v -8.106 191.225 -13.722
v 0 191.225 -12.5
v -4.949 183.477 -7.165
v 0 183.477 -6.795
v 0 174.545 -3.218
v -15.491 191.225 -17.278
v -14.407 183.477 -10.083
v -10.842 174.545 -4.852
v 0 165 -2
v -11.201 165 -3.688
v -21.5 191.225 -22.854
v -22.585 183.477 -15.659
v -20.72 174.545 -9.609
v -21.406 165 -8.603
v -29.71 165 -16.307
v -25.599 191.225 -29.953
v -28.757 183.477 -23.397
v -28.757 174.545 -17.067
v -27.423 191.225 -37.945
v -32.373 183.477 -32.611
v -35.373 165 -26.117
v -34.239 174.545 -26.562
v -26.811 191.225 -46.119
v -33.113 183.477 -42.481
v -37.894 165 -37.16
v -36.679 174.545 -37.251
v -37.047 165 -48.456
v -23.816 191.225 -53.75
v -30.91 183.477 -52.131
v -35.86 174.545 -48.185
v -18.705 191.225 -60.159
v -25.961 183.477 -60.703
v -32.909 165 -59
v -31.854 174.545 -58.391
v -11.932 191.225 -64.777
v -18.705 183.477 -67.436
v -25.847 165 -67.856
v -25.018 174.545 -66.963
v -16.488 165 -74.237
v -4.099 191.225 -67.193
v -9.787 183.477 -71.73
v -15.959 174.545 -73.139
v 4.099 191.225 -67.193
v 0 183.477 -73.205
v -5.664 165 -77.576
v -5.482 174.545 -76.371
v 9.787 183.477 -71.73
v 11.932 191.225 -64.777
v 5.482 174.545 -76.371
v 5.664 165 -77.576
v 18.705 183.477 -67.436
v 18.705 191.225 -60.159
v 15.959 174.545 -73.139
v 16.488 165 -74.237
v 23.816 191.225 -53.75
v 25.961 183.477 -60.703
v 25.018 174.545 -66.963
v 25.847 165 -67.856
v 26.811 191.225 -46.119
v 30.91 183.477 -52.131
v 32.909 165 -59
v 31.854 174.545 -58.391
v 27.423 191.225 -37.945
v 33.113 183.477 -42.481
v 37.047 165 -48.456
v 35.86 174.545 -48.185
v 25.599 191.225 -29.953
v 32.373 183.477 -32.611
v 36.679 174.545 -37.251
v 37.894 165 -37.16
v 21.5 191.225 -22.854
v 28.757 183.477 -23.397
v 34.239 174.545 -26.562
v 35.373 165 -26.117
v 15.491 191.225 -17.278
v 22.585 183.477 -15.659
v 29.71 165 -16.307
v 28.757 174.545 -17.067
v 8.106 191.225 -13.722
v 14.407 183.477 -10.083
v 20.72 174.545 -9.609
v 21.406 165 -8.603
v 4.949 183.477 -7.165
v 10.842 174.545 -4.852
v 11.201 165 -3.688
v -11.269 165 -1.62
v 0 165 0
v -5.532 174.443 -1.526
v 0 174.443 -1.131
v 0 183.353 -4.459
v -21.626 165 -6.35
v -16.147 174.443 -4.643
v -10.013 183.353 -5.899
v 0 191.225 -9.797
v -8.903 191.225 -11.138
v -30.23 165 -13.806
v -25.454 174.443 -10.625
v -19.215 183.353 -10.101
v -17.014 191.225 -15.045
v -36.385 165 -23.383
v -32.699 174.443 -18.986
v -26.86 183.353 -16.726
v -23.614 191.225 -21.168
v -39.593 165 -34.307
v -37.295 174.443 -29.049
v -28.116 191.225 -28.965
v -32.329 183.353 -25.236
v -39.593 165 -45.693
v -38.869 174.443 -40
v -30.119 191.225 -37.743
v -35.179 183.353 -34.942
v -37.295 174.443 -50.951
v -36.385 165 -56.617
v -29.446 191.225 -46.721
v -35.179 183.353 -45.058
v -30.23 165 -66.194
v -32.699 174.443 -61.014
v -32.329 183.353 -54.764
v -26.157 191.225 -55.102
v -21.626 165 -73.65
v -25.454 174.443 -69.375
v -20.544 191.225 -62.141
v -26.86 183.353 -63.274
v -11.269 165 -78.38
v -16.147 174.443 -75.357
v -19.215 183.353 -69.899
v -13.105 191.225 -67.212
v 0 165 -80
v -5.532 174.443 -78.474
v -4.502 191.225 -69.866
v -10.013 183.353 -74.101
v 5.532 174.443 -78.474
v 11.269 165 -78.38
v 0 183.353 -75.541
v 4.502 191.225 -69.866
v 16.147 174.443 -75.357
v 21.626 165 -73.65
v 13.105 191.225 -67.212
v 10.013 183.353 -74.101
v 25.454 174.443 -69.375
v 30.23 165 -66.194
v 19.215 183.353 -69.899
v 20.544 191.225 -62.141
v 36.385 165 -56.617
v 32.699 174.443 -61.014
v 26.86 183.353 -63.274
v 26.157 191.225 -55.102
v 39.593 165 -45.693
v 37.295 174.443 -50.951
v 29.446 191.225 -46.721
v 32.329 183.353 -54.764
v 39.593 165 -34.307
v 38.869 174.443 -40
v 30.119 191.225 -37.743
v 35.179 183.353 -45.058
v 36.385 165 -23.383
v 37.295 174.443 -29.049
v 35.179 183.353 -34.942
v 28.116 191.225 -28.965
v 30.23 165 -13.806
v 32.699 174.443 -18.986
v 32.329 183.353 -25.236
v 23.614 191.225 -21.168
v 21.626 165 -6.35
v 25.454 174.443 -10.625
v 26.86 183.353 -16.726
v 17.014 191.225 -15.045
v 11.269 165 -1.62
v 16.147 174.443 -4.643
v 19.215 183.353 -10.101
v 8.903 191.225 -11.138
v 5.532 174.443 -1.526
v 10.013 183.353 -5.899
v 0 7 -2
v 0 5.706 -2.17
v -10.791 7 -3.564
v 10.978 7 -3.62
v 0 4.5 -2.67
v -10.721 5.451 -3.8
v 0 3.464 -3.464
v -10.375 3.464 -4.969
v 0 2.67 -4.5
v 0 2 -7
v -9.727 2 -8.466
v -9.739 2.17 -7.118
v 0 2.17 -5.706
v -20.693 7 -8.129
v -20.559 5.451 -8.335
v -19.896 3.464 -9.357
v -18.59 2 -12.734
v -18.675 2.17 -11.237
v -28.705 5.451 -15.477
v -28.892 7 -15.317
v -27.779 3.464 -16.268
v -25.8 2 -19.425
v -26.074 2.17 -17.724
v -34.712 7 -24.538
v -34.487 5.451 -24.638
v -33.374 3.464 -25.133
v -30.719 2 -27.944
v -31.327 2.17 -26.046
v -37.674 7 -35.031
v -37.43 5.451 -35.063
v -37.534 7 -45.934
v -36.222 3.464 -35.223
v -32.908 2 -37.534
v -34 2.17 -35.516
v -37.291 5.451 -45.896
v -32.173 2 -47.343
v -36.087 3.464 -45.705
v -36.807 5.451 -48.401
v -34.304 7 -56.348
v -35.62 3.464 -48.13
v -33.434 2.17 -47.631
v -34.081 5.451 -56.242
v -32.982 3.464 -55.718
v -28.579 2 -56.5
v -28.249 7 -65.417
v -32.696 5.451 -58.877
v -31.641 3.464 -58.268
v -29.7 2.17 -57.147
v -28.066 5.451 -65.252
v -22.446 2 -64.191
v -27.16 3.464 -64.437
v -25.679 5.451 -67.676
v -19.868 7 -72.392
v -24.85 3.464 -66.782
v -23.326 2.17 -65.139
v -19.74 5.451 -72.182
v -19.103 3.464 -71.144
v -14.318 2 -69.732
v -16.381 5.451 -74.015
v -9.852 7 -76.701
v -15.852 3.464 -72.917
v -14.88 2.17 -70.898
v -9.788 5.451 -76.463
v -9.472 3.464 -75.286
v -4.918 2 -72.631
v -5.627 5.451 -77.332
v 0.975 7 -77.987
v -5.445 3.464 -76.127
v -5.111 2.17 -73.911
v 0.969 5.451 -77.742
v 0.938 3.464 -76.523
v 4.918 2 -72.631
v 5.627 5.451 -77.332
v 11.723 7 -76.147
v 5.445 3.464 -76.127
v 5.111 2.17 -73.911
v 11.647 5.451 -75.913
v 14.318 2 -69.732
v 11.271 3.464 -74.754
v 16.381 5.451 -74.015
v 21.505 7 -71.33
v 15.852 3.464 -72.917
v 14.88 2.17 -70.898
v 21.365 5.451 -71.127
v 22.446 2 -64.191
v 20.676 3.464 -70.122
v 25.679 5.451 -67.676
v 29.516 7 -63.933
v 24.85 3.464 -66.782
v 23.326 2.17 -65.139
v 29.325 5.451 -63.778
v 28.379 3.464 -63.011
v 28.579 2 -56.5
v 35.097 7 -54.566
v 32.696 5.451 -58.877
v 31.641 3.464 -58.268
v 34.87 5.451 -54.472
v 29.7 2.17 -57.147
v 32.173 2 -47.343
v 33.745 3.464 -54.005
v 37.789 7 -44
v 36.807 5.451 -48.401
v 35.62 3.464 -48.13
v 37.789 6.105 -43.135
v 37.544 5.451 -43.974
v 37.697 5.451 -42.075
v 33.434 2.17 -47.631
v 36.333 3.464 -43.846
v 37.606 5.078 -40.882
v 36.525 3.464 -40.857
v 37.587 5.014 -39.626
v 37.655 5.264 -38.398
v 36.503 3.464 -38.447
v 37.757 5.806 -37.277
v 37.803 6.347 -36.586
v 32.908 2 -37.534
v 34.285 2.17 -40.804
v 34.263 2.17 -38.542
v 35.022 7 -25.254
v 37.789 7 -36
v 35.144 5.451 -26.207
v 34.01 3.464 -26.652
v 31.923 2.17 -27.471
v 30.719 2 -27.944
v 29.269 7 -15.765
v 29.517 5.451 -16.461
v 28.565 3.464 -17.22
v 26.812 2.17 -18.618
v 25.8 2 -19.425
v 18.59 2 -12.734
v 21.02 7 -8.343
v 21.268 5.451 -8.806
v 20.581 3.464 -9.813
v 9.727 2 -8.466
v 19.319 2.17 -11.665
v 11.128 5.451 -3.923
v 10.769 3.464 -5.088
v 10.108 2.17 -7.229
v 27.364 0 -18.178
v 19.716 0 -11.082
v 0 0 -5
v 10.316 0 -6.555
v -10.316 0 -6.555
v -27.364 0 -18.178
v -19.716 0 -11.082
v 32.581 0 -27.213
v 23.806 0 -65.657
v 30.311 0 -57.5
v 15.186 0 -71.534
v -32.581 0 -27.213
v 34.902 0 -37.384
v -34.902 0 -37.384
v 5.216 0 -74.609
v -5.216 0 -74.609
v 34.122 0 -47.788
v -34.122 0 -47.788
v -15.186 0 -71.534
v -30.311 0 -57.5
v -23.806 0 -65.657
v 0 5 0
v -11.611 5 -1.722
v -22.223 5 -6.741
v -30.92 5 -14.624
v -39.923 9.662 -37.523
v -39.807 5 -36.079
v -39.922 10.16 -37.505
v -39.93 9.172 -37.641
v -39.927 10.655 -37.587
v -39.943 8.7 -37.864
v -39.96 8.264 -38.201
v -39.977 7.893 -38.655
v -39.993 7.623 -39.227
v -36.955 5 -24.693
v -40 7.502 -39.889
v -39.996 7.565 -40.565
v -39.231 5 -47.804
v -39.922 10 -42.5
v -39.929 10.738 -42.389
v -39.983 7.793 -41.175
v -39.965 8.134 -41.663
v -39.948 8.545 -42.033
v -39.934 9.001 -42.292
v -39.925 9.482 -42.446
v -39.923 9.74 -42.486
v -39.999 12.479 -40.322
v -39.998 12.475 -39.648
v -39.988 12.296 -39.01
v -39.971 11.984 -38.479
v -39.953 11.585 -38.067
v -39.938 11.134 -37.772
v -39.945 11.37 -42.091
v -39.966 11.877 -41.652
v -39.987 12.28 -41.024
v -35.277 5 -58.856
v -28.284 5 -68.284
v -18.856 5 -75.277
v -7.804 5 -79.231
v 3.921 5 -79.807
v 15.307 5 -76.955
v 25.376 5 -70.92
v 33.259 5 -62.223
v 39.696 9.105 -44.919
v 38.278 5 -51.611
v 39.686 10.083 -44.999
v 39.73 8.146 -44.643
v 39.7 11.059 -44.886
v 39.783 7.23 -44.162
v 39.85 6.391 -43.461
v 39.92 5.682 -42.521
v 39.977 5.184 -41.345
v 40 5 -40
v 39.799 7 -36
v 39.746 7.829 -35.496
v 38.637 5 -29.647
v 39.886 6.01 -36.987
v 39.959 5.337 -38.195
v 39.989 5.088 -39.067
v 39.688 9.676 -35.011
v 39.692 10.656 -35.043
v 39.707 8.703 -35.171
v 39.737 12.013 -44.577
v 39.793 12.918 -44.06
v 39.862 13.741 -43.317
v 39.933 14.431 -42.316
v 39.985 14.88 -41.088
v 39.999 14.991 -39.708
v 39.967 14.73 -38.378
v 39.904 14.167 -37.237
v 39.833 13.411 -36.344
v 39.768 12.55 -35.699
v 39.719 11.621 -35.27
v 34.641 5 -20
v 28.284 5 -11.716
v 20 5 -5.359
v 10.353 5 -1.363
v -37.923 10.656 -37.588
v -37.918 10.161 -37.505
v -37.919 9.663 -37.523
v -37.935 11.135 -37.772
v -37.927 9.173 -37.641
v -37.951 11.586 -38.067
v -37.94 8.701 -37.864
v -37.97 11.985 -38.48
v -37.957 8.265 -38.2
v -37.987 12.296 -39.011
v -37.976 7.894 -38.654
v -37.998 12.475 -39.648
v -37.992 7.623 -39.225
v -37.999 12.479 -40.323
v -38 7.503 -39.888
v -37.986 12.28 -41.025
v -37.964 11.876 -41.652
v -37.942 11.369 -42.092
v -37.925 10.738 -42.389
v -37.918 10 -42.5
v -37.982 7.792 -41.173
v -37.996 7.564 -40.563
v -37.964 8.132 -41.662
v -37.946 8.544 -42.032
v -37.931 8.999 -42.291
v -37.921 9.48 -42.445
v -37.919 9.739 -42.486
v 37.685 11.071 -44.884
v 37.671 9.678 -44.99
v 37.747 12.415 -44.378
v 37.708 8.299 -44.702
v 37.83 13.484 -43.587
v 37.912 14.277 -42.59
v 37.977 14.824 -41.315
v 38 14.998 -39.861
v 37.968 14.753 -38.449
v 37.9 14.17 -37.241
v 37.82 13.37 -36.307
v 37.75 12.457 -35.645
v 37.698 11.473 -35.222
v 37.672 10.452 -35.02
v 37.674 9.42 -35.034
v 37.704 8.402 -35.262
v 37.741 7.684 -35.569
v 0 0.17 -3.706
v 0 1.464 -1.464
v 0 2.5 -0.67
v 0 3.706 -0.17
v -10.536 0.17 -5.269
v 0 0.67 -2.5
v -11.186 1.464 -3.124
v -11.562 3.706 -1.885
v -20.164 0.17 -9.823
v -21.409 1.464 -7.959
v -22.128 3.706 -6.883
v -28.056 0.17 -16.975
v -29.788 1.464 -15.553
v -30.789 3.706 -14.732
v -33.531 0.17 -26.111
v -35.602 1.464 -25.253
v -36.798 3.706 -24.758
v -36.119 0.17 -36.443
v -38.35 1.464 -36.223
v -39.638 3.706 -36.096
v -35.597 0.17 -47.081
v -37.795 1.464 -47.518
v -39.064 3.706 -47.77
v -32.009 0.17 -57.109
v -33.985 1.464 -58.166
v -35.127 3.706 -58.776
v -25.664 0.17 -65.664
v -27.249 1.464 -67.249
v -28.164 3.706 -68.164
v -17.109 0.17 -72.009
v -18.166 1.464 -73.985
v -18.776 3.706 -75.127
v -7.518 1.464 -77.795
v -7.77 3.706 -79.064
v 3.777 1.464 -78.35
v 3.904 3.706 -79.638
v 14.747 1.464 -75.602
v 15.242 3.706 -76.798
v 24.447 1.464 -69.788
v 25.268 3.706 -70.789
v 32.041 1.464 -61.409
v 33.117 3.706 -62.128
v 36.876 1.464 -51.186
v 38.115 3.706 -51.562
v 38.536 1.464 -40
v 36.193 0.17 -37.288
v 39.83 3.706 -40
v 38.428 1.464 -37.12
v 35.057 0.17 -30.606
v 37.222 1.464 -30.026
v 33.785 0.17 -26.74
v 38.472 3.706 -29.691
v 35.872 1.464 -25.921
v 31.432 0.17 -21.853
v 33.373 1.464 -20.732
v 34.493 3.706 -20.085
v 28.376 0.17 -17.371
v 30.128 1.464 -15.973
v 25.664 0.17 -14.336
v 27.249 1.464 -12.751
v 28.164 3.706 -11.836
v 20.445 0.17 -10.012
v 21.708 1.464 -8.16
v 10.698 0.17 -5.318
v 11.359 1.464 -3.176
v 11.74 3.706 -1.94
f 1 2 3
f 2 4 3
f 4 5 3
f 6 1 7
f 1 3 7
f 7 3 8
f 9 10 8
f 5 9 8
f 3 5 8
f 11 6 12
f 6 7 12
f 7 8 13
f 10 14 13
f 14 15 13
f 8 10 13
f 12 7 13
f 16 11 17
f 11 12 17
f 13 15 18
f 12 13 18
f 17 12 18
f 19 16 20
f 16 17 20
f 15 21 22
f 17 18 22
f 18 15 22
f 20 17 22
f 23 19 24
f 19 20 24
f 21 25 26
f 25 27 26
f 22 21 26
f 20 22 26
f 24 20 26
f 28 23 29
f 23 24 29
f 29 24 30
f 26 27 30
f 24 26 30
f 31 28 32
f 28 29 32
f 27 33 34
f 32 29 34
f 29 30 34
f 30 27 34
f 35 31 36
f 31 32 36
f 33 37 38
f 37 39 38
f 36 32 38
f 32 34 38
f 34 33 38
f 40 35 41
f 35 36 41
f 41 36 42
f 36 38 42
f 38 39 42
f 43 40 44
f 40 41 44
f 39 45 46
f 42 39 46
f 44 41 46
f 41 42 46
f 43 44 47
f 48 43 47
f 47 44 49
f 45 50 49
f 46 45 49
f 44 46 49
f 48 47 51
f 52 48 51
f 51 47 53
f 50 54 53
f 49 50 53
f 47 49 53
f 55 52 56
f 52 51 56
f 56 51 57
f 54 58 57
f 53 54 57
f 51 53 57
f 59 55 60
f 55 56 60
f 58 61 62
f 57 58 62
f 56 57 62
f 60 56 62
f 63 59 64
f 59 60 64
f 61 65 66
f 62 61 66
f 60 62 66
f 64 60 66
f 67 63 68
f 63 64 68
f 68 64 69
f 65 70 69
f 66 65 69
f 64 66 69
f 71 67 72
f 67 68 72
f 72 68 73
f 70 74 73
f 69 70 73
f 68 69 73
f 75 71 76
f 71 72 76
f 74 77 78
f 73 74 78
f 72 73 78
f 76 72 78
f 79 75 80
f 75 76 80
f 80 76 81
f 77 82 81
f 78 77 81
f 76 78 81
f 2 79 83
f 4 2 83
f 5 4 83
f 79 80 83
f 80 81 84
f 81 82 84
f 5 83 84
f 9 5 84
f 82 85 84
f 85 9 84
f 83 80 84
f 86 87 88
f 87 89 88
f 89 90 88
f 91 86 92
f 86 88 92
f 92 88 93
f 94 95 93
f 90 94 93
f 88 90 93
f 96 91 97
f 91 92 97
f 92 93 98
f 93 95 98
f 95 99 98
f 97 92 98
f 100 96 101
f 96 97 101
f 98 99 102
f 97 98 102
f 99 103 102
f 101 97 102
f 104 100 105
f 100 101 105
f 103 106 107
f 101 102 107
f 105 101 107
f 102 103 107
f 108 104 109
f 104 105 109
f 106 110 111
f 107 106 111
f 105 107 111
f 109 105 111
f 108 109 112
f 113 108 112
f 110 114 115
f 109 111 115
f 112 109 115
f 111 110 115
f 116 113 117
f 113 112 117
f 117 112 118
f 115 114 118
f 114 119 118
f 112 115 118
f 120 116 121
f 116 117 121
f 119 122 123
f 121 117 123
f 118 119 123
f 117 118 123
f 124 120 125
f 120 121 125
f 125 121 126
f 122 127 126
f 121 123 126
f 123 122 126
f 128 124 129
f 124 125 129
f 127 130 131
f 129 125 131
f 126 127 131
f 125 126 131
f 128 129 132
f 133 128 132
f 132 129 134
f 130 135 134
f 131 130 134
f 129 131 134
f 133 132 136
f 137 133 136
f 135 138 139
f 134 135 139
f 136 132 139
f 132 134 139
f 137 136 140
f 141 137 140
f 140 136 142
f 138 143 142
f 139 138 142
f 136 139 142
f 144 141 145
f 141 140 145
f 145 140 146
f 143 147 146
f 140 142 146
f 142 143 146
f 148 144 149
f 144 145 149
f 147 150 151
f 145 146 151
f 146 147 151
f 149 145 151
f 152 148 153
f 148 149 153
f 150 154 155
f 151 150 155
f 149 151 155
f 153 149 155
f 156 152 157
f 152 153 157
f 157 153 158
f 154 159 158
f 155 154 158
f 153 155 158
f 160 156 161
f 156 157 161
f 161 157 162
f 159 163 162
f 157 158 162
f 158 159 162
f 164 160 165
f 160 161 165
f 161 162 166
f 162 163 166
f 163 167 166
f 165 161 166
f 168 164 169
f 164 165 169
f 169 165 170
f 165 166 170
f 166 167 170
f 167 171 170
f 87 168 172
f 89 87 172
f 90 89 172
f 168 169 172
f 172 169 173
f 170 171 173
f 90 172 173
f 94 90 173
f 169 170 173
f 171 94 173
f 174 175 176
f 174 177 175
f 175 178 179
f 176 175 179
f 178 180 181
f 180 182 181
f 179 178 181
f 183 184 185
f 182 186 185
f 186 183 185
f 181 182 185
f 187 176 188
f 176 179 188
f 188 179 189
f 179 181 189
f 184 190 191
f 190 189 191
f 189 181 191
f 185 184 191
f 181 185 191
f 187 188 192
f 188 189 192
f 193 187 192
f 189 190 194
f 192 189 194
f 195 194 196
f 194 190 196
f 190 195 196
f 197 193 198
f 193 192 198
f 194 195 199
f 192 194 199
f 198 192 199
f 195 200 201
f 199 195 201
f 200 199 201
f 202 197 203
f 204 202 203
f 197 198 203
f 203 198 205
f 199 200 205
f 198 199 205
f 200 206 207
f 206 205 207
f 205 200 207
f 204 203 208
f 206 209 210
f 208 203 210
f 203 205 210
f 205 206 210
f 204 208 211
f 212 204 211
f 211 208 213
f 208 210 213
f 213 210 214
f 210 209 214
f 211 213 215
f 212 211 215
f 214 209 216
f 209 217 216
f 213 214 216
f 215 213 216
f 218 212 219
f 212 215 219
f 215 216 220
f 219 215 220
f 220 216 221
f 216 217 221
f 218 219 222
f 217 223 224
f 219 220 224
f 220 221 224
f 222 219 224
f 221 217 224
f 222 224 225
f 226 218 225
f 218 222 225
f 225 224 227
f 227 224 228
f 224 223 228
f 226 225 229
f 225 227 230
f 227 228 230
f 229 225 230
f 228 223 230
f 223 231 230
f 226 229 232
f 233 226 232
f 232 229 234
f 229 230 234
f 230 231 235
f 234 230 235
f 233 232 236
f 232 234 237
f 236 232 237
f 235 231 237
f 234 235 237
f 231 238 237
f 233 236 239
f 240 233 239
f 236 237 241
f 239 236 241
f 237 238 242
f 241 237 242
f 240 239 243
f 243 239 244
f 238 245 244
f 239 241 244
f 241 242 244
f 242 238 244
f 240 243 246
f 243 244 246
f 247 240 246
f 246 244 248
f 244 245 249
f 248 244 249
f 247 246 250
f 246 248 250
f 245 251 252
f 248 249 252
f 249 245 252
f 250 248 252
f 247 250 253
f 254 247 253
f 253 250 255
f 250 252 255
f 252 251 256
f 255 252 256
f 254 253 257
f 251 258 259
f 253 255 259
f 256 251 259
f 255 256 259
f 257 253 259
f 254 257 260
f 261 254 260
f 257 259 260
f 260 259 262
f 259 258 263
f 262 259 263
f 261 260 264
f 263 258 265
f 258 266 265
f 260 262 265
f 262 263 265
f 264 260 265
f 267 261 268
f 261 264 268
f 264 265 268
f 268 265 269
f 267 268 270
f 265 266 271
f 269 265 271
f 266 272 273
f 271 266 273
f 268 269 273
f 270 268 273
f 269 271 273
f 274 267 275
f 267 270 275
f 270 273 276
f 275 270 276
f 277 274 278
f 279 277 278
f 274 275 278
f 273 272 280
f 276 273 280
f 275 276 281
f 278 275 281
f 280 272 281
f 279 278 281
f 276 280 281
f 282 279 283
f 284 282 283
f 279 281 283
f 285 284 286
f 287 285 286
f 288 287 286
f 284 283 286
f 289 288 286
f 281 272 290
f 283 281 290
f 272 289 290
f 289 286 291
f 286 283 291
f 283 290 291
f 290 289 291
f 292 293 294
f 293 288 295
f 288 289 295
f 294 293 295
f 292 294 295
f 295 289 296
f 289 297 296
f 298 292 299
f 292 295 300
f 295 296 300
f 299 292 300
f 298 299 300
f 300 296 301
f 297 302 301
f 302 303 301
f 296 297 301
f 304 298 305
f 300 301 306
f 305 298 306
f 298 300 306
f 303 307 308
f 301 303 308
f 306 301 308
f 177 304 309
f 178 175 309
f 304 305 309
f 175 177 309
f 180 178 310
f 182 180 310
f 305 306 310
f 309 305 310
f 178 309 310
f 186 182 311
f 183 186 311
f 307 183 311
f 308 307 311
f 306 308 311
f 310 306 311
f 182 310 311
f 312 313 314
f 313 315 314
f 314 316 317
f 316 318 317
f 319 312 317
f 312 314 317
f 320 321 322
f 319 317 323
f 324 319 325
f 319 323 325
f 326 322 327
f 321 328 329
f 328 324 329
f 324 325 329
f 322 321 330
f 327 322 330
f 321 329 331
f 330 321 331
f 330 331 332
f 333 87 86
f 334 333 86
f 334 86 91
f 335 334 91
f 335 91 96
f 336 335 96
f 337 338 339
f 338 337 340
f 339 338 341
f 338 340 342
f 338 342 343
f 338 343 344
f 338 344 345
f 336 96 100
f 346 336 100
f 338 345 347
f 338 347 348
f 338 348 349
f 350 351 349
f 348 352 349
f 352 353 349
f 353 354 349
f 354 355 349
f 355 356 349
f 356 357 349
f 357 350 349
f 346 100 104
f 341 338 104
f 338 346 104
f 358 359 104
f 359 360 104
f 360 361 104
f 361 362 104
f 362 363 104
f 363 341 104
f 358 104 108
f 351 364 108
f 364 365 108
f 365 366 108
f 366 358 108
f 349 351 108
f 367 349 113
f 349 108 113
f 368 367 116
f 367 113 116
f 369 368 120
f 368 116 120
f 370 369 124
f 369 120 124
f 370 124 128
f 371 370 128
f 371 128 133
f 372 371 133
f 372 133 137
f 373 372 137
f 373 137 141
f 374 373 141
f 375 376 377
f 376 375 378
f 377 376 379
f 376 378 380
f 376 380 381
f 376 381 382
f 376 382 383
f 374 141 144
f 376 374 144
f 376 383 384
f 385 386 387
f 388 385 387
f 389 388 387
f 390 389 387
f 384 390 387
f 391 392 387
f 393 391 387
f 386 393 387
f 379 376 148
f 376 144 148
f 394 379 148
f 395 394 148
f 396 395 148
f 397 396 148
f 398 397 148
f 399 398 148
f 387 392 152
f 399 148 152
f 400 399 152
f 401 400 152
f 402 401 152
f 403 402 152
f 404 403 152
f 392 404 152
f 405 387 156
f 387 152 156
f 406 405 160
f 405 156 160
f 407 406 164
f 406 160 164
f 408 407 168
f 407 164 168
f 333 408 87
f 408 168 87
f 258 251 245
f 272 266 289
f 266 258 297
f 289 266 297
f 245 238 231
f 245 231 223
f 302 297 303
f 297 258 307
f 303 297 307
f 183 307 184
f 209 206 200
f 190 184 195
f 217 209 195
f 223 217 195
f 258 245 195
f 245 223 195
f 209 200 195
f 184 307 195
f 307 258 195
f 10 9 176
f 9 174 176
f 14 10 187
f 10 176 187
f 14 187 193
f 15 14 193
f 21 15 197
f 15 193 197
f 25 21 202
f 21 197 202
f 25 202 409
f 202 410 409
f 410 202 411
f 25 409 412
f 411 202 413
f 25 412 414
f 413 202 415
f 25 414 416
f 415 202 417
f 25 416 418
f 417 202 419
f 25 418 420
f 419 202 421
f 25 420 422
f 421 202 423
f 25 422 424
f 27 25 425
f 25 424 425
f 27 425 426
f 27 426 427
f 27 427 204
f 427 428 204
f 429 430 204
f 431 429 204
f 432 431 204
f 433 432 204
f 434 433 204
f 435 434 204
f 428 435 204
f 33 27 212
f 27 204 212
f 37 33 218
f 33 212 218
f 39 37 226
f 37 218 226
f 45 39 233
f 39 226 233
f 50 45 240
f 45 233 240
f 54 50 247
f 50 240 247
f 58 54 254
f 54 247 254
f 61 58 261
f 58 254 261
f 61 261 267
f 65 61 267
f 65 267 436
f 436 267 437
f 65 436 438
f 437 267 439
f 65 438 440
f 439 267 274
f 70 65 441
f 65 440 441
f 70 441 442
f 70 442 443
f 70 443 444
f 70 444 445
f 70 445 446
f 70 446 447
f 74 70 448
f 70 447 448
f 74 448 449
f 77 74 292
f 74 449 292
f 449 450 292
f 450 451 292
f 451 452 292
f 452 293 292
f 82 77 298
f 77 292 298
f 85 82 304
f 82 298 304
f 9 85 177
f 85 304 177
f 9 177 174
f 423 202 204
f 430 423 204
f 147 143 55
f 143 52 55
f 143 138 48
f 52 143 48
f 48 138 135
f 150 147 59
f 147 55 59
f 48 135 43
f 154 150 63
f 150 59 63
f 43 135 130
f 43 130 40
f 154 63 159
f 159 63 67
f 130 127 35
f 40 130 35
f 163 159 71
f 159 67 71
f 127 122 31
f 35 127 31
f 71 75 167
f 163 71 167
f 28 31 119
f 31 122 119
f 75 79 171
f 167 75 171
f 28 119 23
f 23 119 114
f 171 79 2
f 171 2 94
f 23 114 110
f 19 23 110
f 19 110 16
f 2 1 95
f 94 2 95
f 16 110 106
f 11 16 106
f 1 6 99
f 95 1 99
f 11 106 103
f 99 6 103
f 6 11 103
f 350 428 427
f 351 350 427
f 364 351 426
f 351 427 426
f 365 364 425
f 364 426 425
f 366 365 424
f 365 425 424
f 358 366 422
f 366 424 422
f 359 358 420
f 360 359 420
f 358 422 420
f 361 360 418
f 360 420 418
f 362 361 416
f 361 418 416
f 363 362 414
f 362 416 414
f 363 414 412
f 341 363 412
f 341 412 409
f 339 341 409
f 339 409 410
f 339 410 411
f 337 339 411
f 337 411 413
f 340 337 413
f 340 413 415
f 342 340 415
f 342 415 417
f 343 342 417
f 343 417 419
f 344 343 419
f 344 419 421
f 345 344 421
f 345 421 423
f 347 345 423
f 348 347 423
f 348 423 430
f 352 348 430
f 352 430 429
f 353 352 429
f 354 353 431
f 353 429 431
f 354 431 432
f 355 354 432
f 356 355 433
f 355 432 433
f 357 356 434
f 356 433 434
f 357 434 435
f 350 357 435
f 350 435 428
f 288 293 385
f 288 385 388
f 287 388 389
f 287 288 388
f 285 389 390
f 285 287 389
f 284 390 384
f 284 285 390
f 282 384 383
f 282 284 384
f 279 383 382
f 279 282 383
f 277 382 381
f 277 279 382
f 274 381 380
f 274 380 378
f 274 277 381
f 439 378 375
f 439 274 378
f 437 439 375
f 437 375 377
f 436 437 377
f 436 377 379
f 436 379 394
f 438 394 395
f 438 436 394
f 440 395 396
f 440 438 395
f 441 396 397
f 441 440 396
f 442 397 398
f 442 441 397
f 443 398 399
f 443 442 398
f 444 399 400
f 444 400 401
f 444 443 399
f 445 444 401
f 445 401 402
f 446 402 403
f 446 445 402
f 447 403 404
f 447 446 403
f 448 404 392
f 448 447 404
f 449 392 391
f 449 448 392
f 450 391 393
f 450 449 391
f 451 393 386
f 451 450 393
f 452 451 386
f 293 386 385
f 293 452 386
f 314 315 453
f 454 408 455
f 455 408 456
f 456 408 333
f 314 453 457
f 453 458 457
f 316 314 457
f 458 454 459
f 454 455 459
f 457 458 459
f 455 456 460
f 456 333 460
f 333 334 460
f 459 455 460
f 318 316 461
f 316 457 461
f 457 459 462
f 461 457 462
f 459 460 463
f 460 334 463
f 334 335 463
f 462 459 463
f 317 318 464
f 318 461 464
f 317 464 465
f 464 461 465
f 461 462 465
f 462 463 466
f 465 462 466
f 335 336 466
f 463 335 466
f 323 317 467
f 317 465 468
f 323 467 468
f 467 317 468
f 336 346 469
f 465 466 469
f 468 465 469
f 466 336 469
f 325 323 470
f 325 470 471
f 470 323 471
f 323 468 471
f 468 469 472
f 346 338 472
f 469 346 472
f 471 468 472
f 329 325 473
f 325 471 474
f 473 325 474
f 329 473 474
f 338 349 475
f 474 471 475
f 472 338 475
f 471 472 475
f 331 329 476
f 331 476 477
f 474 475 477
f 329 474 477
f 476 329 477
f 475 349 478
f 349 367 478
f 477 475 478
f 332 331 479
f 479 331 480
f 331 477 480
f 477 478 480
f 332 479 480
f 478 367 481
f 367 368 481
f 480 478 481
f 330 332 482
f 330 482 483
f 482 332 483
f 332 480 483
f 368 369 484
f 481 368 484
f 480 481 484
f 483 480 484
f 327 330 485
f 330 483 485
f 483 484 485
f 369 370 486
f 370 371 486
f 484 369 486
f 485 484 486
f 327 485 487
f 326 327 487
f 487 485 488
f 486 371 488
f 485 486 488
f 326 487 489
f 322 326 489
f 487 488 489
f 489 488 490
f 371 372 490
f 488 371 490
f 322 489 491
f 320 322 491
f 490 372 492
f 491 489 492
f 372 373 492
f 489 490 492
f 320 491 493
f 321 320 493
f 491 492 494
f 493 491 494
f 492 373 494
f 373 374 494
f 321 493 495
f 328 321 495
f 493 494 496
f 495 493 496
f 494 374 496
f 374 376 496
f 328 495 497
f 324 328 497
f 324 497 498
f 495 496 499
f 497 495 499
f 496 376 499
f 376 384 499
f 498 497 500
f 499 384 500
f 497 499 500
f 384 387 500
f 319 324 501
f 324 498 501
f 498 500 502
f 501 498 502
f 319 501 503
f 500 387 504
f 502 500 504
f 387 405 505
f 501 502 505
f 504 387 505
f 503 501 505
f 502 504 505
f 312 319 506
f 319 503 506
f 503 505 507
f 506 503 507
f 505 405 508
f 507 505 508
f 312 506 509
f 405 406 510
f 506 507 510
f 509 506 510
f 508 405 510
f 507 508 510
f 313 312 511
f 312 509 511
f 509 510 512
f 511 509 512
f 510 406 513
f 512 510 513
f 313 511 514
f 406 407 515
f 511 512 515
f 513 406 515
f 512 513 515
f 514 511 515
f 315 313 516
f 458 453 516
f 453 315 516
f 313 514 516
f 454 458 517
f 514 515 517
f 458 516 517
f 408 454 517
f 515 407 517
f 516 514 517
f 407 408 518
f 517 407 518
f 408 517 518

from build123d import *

# Parameters (mm, degrees)
SKETCH5_R          = 5
CUT_EXTRUDE1_DEPTH = 50
SKETCH5_3_R        = 2.5
CUT_EXTRUDE2_DEPTH = 50


with BuildPart() as part:
    # Sketch3 → Revolve4 (revolve)
    with BuildSketch(Plane(origin=(0, 0, 0), x_dir=(0, 0, -1), z_dir=(1, 0, 0))):
        with BuildLine():
            Line((40, 2), (40, 0))
            Line((40, 0), (75, 0))
            ThreePointArc((75, 0), (78.535533906, 1.464466094), (80, 5))
            Line((80, 5), (80, 165))
            ThreePointArc((80, 165), (77.47091582, 178.997516479), (70.203476621, 191.224988084))
            Line((70.203476621, 191.224988084), (67.5, 191.224988084))
            ThreePointArc((67.5, 191.224988084), (75.277471565, 179.124446892), (78, 165))
            Line((78, 165), (78, 7))
            ThreePointArc((78, 7), (76.535533906, 3.464466094), (73, 2))
            Line((73, 2), (42, 2))
            Line((42, 2), (40, 2))
        make_face()
    revolve(axis=Axis((0, 250.694261232, -40), (0, -1, 0)))

    # Sketch5 → Cut-Extrude1 (cut)
    with BuildSketch(Plane(origin=(0, 0, 0), x_dir=(0, 0, -1), z_dir=(1, 0, 0))):
        with Locations((40, 10)):
            Circle(SKETCH5_R)
    extrude(amount=CUT_EXTRUDE1_DEPTH, mode=Mode.SUBTRACT)

    # Sketch5<3> → Cut-Extrude2 (cut)
    with BuildSketch(Plane(origin=(0, 0, 0), x_dir=(0, 0, -1), z_dir=(1, 0, 0))):
        with Locations((40, 10)):
            Circle(SKETCH5_3_R)
    extrude(amount=-CUT_EXTRUDE2_DEPTH, mode=Mode.SUBTRACT)


solid = part.part
